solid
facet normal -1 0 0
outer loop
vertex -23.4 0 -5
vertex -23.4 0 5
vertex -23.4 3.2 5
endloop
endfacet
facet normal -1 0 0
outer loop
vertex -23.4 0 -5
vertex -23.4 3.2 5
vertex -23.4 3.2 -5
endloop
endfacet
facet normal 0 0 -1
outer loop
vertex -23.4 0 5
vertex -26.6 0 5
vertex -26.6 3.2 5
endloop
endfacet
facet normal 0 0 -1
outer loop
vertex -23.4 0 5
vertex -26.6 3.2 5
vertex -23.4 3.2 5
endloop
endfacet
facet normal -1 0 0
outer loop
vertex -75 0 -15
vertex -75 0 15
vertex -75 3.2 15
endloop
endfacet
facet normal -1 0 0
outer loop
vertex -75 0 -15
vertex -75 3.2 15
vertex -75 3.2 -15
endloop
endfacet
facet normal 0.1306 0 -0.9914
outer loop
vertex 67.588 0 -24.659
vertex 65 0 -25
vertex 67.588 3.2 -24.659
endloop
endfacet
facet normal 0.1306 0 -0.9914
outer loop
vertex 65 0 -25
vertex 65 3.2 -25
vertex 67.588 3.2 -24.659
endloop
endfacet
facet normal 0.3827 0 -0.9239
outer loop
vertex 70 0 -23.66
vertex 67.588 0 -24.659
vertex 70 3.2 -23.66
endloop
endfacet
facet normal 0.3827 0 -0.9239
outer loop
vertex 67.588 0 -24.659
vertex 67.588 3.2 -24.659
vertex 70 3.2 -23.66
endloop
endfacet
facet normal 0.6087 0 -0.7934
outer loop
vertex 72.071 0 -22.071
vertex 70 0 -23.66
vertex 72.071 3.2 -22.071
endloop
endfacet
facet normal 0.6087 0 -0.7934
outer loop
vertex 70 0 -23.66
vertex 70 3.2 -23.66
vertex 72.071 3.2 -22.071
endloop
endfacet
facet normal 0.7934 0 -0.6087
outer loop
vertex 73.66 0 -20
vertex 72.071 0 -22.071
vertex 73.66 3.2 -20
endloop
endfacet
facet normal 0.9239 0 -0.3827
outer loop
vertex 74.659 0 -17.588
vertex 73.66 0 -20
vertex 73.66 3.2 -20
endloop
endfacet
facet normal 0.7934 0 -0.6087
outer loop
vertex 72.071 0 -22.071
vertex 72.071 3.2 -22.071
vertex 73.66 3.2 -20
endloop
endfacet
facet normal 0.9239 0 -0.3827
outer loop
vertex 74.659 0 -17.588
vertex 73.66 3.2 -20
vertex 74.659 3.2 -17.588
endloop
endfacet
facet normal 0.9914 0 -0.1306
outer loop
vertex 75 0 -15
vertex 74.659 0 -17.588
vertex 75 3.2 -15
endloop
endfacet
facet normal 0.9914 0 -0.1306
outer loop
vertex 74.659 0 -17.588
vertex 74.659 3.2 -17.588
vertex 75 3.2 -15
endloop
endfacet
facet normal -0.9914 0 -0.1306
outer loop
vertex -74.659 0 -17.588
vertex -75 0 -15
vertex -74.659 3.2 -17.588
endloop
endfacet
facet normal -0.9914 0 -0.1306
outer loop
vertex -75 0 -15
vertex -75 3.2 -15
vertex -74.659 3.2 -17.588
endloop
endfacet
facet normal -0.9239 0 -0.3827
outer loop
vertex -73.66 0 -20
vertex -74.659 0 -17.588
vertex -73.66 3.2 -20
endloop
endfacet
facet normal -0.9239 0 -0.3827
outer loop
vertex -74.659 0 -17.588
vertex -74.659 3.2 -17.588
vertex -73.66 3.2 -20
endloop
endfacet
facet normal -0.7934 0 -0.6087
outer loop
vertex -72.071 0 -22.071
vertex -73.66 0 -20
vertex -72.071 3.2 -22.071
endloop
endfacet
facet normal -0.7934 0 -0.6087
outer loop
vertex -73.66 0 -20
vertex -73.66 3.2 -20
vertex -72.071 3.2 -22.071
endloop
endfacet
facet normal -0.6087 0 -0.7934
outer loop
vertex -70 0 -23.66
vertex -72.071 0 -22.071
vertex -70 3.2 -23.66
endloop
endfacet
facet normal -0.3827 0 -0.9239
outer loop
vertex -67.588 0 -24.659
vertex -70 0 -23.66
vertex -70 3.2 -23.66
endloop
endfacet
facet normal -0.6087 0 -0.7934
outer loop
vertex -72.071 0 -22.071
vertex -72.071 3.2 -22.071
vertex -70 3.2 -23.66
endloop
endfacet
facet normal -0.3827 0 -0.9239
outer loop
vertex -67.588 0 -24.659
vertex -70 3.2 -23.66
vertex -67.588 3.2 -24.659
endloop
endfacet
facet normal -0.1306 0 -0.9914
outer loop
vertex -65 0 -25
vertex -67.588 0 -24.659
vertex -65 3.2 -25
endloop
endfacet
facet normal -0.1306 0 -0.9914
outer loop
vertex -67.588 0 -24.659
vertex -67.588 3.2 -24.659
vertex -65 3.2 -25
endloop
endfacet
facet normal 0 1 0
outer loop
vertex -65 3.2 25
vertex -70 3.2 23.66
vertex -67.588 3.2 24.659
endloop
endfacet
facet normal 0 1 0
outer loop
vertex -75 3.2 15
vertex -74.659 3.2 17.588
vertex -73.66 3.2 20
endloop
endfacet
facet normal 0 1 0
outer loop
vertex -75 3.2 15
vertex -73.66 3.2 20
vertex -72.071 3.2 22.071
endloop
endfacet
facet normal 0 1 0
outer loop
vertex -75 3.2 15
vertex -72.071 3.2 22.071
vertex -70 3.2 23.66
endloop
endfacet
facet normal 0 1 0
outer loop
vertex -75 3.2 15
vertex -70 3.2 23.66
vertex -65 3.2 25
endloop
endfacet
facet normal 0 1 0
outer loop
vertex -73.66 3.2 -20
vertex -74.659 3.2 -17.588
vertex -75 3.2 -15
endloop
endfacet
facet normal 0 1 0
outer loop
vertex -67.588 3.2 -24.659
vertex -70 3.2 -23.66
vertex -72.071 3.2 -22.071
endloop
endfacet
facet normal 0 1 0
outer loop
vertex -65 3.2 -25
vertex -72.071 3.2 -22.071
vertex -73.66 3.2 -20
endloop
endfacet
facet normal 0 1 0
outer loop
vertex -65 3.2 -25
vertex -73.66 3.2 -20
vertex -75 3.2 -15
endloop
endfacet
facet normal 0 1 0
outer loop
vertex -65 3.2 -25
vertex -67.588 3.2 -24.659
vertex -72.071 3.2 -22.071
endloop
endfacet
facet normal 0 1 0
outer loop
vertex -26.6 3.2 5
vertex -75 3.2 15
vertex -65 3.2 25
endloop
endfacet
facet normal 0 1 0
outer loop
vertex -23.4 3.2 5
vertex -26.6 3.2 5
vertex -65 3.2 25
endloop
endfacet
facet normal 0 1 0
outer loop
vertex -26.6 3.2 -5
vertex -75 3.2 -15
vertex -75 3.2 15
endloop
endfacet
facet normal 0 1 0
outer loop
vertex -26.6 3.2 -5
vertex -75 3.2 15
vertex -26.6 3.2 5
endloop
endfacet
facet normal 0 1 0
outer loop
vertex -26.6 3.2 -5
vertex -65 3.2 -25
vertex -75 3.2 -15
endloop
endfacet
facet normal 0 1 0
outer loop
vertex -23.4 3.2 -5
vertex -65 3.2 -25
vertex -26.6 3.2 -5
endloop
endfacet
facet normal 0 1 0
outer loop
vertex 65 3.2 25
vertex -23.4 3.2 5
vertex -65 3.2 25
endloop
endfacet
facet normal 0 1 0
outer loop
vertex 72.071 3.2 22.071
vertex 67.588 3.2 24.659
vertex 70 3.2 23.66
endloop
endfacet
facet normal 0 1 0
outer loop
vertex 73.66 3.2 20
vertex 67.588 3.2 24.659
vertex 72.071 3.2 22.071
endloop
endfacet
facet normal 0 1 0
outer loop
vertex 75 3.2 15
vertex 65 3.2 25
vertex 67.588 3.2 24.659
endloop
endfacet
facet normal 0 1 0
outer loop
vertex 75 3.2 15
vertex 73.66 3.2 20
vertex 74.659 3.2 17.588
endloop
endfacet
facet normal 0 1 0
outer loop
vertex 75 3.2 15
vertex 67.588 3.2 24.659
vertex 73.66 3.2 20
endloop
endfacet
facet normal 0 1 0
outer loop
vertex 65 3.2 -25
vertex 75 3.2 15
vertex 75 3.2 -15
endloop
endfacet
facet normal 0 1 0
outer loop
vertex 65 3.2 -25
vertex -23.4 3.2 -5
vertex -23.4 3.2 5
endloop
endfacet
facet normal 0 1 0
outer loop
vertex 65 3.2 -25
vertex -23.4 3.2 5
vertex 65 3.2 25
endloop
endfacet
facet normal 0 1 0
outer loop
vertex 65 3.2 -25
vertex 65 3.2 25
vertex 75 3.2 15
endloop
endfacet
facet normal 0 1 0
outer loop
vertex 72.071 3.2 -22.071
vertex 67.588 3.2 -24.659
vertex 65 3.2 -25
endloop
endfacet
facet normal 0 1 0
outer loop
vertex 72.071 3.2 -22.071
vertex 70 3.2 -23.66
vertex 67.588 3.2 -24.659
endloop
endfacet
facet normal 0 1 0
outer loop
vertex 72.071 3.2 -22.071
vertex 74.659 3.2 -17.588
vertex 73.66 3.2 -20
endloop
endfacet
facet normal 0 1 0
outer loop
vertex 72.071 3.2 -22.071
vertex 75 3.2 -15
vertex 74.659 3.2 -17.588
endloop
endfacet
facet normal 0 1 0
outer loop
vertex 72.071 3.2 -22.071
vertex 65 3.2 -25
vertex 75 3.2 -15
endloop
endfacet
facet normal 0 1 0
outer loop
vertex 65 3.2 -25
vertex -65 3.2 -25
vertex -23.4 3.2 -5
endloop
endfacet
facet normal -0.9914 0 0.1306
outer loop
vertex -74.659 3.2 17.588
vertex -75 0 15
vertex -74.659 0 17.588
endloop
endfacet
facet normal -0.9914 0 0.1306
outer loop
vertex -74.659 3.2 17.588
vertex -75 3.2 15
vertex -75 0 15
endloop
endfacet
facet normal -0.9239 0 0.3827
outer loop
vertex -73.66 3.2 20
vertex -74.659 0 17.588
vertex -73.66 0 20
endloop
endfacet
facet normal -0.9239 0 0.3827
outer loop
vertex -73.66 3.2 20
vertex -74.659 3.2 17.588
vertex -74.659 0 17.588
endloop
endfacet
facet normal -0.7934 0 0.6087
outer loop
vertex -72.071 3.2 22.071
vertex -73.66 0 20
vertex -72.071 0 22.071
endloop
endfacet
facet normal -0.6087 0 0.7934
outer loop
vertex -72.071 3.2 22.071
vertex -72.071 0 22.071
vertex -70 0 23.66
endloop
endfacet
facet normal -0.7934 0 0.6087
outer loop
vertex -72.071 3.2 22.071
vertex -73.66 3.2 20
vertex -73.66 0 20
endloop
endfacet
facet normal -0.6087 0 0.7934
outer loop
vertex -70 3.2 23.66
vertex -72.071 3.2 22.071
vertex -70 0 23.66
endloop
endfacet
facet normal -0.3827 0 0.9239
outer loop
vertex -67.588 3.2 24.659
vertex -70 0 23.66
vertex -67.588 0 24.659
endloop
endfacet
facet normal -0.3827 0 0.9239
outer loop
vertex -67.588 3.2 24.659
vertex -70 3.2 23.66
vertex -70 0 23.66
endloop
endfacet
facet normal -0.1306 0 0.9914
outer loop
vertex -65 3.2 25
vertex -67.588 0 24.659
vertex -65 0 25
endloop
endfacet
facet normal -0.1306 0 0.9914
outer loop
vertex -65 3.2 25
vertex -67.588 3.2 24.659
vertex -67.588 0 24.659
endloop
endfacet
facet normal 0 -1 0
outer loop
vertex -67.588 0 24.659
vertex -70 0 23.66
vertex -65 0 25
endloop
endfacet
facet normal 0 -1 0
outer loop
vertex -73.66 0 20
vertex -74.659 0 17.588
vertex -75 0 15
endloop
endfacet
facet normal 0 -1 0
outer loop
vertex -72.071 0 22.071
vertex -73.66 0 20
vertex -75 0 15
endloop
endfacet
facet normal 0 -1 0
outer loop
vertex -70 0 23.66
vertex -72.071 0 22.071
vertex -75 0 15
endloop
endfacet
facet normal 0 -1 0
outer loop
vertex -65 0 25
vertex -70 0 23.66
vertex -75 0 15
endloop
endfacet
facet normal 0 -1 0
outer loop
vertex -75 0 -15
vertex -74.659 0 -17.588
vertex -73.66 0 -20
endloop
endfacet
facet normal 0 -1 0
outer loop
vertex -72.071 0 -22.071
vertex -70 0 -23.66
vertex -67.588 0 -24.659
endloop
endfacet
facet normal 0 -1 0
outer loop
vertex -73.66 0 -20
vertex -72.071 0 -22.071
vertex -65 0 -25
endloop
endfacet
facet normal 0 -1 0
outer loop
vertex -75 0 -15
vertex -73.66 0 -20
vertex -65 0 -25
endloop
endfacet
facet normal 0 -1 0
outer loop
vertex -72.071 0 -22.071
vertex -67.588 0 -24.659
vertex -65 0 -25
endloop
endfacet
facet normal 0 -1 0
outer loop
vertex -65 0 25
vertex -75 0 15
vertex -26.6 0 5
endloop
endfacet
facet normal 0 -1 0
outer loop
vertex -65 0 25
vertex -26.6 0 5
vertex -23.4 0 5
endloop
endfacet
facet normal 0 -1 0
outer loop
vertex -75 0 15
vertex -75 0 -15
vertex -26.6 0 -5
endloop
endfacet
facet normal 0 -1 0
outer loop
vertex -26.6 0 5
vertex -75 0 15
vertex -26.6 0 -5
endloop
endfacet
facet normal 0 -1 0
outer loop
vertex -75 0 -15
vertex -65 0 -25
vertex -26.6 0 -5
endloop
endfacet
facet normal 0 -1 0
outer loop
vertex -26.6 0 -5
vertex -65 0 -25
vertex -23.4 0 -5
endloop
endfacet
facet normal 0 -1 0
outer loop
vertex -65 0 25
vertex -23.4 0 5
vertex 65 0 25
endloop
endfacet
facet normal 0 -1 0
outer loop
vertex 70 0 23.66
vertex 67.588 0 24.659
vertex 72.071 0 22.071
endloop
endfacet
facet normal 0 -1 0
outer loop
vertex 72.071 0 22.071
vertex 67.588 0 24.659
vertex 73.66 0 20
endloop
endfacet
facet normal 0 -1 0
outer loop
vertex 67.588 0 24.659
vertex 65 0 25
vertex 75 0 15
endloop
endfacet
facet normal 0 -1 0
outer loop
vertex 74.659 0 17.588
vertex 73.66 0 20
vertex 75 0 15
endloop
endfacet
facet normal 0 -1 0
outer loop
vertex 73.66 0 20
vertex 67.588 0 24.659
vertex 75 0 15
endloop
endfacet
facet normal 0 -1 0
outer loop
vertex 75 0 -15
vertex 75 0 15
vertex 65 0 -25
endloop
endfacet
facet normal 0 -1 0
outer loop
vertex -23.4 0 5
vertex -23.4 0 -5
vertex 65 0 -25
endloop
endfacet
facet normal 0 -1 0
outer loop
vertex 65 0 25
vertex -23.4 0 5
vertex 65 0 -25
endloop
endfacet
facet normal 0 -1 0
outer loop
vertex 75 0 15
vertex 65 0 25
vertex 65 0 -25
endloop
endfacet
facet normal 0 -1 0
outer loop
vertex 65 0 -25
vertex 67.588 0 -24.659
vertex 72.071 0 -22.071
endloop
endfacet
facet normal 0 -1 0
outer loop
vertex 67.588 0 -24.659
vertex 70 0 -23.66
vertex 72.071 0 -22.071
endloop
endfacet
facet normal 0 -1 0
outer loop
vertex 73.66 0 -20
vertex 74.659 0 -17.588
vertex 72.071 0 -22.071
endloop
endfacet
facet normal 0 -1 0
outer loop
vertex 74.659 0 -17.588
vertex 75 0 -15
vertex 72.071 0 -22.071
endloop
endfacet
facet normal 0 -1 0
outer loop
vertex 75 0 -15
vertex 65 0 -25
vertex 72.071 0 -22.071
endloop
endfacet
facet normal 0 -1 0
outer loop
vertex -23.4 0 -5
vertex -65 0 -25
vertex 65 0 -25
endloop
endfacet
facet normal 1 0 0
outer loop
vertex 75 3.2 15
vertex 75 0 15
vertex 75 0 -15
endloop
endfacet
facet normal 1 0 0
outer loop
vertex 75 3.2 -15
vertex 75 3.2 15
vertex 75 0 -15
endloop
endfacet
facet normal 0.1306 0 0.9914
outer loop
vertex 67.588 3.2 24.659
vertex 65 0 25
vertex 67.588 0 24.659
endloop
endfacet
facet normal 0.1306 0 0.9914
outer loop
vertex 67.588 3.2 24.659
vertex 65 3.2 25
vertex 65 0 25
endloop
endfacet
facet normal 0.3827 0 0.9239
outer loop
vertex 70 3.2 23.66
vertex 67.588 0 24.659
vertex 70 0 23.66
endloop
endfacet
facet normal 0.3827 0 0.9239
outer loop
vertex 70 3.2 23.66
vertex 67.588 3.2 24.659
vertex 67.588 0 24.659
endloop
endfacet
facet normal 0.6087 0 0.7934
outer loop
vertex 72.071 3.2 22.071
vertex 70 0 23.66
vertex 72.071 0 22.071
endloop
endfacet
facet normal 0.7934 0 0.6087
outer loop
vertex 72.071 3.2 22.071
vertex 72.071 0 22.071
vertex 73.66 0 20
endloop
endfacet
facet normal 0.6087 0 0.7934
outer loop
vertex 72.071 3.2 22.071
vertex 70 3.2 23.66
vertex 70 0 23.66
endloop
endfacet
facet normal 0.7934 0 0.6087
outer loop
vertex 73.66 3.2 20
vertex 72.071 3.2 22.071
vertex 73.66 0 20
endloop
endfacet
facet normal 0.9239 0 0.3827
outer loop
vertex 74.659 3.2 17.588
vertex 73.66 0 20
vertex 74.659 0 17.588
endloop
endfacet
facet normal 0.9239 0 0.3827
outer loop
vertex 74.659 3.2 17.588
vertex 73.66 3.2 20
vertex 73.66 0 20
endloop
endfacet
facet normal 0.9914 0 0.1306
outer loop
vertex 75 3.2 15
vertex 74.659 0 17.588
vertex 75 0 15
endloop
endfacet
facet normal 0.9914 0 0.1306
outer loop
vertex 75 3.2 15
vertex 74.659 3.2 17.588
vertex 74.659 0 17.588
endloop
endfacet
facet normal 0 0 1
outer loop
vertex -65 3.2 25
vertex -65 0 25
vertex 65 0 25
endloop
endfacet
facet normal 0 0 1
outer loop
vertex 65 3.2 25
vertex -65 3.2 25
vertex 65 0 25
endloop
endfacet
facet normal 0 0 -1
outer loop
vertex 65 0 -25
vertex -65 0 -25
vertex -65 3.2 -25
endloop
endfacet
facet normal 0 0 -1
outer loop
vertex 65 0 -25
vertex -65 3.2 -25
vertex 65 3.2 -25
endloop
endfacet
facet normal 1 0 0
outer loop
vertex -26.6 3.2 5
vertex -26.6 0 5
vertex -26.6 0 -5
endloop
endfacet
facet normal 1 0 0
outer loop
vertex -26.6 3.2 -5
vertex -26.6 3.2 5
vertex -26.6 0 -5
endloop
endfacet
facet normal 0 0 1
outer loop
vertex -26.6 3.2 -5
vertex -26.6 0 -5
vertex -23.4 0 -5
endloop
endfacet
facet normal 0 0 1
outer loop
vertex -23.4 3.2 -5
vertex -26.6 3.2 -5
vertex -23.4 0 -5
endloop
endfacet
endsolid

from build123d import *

# Parameters (mm, degrees)
BASE_SKETCH_W       = 150
BASE_SKETCH_H       = 50
BASE_SKETCH_W_2     = 3.2
BASE_SKETCH_H_2     = 10
BOSS_EXTRUDE1_DEPTH = 3.2
FILLET1_R           = 10


with BuildPart() as part:
    # Base_Sketch → Boss-Extrude1 (new body)
    with BuildSketch(Plane(origin=(0, 0, 0), x_dir=(1, 0, 0), z_dir=(0, 1, 0))):
        Rectangle(BASE_SKETCH_W, BASE_SKETCH_H)
        with Locations((-25, 0)):
            Rectangle(BASE_SKETCH_W_2, BASE_SKETCH_H_2, mode=Mode.SUBTRACT)
    extrude(amount=BOSS_EXTRUDE1_DEPTH)

    # Fillet1
    fillet1_edges = [part.edges().sort_by_distance(p)[0] for p in [
        (75, 1.6, 25),
        (-75, 1.6, 25),
        (-75, 1.6, -25),
        (75, 1.6, -25),
    ]]
    fillet(fillet1_edges, radius=FILLET1_R)


solid = part.part
